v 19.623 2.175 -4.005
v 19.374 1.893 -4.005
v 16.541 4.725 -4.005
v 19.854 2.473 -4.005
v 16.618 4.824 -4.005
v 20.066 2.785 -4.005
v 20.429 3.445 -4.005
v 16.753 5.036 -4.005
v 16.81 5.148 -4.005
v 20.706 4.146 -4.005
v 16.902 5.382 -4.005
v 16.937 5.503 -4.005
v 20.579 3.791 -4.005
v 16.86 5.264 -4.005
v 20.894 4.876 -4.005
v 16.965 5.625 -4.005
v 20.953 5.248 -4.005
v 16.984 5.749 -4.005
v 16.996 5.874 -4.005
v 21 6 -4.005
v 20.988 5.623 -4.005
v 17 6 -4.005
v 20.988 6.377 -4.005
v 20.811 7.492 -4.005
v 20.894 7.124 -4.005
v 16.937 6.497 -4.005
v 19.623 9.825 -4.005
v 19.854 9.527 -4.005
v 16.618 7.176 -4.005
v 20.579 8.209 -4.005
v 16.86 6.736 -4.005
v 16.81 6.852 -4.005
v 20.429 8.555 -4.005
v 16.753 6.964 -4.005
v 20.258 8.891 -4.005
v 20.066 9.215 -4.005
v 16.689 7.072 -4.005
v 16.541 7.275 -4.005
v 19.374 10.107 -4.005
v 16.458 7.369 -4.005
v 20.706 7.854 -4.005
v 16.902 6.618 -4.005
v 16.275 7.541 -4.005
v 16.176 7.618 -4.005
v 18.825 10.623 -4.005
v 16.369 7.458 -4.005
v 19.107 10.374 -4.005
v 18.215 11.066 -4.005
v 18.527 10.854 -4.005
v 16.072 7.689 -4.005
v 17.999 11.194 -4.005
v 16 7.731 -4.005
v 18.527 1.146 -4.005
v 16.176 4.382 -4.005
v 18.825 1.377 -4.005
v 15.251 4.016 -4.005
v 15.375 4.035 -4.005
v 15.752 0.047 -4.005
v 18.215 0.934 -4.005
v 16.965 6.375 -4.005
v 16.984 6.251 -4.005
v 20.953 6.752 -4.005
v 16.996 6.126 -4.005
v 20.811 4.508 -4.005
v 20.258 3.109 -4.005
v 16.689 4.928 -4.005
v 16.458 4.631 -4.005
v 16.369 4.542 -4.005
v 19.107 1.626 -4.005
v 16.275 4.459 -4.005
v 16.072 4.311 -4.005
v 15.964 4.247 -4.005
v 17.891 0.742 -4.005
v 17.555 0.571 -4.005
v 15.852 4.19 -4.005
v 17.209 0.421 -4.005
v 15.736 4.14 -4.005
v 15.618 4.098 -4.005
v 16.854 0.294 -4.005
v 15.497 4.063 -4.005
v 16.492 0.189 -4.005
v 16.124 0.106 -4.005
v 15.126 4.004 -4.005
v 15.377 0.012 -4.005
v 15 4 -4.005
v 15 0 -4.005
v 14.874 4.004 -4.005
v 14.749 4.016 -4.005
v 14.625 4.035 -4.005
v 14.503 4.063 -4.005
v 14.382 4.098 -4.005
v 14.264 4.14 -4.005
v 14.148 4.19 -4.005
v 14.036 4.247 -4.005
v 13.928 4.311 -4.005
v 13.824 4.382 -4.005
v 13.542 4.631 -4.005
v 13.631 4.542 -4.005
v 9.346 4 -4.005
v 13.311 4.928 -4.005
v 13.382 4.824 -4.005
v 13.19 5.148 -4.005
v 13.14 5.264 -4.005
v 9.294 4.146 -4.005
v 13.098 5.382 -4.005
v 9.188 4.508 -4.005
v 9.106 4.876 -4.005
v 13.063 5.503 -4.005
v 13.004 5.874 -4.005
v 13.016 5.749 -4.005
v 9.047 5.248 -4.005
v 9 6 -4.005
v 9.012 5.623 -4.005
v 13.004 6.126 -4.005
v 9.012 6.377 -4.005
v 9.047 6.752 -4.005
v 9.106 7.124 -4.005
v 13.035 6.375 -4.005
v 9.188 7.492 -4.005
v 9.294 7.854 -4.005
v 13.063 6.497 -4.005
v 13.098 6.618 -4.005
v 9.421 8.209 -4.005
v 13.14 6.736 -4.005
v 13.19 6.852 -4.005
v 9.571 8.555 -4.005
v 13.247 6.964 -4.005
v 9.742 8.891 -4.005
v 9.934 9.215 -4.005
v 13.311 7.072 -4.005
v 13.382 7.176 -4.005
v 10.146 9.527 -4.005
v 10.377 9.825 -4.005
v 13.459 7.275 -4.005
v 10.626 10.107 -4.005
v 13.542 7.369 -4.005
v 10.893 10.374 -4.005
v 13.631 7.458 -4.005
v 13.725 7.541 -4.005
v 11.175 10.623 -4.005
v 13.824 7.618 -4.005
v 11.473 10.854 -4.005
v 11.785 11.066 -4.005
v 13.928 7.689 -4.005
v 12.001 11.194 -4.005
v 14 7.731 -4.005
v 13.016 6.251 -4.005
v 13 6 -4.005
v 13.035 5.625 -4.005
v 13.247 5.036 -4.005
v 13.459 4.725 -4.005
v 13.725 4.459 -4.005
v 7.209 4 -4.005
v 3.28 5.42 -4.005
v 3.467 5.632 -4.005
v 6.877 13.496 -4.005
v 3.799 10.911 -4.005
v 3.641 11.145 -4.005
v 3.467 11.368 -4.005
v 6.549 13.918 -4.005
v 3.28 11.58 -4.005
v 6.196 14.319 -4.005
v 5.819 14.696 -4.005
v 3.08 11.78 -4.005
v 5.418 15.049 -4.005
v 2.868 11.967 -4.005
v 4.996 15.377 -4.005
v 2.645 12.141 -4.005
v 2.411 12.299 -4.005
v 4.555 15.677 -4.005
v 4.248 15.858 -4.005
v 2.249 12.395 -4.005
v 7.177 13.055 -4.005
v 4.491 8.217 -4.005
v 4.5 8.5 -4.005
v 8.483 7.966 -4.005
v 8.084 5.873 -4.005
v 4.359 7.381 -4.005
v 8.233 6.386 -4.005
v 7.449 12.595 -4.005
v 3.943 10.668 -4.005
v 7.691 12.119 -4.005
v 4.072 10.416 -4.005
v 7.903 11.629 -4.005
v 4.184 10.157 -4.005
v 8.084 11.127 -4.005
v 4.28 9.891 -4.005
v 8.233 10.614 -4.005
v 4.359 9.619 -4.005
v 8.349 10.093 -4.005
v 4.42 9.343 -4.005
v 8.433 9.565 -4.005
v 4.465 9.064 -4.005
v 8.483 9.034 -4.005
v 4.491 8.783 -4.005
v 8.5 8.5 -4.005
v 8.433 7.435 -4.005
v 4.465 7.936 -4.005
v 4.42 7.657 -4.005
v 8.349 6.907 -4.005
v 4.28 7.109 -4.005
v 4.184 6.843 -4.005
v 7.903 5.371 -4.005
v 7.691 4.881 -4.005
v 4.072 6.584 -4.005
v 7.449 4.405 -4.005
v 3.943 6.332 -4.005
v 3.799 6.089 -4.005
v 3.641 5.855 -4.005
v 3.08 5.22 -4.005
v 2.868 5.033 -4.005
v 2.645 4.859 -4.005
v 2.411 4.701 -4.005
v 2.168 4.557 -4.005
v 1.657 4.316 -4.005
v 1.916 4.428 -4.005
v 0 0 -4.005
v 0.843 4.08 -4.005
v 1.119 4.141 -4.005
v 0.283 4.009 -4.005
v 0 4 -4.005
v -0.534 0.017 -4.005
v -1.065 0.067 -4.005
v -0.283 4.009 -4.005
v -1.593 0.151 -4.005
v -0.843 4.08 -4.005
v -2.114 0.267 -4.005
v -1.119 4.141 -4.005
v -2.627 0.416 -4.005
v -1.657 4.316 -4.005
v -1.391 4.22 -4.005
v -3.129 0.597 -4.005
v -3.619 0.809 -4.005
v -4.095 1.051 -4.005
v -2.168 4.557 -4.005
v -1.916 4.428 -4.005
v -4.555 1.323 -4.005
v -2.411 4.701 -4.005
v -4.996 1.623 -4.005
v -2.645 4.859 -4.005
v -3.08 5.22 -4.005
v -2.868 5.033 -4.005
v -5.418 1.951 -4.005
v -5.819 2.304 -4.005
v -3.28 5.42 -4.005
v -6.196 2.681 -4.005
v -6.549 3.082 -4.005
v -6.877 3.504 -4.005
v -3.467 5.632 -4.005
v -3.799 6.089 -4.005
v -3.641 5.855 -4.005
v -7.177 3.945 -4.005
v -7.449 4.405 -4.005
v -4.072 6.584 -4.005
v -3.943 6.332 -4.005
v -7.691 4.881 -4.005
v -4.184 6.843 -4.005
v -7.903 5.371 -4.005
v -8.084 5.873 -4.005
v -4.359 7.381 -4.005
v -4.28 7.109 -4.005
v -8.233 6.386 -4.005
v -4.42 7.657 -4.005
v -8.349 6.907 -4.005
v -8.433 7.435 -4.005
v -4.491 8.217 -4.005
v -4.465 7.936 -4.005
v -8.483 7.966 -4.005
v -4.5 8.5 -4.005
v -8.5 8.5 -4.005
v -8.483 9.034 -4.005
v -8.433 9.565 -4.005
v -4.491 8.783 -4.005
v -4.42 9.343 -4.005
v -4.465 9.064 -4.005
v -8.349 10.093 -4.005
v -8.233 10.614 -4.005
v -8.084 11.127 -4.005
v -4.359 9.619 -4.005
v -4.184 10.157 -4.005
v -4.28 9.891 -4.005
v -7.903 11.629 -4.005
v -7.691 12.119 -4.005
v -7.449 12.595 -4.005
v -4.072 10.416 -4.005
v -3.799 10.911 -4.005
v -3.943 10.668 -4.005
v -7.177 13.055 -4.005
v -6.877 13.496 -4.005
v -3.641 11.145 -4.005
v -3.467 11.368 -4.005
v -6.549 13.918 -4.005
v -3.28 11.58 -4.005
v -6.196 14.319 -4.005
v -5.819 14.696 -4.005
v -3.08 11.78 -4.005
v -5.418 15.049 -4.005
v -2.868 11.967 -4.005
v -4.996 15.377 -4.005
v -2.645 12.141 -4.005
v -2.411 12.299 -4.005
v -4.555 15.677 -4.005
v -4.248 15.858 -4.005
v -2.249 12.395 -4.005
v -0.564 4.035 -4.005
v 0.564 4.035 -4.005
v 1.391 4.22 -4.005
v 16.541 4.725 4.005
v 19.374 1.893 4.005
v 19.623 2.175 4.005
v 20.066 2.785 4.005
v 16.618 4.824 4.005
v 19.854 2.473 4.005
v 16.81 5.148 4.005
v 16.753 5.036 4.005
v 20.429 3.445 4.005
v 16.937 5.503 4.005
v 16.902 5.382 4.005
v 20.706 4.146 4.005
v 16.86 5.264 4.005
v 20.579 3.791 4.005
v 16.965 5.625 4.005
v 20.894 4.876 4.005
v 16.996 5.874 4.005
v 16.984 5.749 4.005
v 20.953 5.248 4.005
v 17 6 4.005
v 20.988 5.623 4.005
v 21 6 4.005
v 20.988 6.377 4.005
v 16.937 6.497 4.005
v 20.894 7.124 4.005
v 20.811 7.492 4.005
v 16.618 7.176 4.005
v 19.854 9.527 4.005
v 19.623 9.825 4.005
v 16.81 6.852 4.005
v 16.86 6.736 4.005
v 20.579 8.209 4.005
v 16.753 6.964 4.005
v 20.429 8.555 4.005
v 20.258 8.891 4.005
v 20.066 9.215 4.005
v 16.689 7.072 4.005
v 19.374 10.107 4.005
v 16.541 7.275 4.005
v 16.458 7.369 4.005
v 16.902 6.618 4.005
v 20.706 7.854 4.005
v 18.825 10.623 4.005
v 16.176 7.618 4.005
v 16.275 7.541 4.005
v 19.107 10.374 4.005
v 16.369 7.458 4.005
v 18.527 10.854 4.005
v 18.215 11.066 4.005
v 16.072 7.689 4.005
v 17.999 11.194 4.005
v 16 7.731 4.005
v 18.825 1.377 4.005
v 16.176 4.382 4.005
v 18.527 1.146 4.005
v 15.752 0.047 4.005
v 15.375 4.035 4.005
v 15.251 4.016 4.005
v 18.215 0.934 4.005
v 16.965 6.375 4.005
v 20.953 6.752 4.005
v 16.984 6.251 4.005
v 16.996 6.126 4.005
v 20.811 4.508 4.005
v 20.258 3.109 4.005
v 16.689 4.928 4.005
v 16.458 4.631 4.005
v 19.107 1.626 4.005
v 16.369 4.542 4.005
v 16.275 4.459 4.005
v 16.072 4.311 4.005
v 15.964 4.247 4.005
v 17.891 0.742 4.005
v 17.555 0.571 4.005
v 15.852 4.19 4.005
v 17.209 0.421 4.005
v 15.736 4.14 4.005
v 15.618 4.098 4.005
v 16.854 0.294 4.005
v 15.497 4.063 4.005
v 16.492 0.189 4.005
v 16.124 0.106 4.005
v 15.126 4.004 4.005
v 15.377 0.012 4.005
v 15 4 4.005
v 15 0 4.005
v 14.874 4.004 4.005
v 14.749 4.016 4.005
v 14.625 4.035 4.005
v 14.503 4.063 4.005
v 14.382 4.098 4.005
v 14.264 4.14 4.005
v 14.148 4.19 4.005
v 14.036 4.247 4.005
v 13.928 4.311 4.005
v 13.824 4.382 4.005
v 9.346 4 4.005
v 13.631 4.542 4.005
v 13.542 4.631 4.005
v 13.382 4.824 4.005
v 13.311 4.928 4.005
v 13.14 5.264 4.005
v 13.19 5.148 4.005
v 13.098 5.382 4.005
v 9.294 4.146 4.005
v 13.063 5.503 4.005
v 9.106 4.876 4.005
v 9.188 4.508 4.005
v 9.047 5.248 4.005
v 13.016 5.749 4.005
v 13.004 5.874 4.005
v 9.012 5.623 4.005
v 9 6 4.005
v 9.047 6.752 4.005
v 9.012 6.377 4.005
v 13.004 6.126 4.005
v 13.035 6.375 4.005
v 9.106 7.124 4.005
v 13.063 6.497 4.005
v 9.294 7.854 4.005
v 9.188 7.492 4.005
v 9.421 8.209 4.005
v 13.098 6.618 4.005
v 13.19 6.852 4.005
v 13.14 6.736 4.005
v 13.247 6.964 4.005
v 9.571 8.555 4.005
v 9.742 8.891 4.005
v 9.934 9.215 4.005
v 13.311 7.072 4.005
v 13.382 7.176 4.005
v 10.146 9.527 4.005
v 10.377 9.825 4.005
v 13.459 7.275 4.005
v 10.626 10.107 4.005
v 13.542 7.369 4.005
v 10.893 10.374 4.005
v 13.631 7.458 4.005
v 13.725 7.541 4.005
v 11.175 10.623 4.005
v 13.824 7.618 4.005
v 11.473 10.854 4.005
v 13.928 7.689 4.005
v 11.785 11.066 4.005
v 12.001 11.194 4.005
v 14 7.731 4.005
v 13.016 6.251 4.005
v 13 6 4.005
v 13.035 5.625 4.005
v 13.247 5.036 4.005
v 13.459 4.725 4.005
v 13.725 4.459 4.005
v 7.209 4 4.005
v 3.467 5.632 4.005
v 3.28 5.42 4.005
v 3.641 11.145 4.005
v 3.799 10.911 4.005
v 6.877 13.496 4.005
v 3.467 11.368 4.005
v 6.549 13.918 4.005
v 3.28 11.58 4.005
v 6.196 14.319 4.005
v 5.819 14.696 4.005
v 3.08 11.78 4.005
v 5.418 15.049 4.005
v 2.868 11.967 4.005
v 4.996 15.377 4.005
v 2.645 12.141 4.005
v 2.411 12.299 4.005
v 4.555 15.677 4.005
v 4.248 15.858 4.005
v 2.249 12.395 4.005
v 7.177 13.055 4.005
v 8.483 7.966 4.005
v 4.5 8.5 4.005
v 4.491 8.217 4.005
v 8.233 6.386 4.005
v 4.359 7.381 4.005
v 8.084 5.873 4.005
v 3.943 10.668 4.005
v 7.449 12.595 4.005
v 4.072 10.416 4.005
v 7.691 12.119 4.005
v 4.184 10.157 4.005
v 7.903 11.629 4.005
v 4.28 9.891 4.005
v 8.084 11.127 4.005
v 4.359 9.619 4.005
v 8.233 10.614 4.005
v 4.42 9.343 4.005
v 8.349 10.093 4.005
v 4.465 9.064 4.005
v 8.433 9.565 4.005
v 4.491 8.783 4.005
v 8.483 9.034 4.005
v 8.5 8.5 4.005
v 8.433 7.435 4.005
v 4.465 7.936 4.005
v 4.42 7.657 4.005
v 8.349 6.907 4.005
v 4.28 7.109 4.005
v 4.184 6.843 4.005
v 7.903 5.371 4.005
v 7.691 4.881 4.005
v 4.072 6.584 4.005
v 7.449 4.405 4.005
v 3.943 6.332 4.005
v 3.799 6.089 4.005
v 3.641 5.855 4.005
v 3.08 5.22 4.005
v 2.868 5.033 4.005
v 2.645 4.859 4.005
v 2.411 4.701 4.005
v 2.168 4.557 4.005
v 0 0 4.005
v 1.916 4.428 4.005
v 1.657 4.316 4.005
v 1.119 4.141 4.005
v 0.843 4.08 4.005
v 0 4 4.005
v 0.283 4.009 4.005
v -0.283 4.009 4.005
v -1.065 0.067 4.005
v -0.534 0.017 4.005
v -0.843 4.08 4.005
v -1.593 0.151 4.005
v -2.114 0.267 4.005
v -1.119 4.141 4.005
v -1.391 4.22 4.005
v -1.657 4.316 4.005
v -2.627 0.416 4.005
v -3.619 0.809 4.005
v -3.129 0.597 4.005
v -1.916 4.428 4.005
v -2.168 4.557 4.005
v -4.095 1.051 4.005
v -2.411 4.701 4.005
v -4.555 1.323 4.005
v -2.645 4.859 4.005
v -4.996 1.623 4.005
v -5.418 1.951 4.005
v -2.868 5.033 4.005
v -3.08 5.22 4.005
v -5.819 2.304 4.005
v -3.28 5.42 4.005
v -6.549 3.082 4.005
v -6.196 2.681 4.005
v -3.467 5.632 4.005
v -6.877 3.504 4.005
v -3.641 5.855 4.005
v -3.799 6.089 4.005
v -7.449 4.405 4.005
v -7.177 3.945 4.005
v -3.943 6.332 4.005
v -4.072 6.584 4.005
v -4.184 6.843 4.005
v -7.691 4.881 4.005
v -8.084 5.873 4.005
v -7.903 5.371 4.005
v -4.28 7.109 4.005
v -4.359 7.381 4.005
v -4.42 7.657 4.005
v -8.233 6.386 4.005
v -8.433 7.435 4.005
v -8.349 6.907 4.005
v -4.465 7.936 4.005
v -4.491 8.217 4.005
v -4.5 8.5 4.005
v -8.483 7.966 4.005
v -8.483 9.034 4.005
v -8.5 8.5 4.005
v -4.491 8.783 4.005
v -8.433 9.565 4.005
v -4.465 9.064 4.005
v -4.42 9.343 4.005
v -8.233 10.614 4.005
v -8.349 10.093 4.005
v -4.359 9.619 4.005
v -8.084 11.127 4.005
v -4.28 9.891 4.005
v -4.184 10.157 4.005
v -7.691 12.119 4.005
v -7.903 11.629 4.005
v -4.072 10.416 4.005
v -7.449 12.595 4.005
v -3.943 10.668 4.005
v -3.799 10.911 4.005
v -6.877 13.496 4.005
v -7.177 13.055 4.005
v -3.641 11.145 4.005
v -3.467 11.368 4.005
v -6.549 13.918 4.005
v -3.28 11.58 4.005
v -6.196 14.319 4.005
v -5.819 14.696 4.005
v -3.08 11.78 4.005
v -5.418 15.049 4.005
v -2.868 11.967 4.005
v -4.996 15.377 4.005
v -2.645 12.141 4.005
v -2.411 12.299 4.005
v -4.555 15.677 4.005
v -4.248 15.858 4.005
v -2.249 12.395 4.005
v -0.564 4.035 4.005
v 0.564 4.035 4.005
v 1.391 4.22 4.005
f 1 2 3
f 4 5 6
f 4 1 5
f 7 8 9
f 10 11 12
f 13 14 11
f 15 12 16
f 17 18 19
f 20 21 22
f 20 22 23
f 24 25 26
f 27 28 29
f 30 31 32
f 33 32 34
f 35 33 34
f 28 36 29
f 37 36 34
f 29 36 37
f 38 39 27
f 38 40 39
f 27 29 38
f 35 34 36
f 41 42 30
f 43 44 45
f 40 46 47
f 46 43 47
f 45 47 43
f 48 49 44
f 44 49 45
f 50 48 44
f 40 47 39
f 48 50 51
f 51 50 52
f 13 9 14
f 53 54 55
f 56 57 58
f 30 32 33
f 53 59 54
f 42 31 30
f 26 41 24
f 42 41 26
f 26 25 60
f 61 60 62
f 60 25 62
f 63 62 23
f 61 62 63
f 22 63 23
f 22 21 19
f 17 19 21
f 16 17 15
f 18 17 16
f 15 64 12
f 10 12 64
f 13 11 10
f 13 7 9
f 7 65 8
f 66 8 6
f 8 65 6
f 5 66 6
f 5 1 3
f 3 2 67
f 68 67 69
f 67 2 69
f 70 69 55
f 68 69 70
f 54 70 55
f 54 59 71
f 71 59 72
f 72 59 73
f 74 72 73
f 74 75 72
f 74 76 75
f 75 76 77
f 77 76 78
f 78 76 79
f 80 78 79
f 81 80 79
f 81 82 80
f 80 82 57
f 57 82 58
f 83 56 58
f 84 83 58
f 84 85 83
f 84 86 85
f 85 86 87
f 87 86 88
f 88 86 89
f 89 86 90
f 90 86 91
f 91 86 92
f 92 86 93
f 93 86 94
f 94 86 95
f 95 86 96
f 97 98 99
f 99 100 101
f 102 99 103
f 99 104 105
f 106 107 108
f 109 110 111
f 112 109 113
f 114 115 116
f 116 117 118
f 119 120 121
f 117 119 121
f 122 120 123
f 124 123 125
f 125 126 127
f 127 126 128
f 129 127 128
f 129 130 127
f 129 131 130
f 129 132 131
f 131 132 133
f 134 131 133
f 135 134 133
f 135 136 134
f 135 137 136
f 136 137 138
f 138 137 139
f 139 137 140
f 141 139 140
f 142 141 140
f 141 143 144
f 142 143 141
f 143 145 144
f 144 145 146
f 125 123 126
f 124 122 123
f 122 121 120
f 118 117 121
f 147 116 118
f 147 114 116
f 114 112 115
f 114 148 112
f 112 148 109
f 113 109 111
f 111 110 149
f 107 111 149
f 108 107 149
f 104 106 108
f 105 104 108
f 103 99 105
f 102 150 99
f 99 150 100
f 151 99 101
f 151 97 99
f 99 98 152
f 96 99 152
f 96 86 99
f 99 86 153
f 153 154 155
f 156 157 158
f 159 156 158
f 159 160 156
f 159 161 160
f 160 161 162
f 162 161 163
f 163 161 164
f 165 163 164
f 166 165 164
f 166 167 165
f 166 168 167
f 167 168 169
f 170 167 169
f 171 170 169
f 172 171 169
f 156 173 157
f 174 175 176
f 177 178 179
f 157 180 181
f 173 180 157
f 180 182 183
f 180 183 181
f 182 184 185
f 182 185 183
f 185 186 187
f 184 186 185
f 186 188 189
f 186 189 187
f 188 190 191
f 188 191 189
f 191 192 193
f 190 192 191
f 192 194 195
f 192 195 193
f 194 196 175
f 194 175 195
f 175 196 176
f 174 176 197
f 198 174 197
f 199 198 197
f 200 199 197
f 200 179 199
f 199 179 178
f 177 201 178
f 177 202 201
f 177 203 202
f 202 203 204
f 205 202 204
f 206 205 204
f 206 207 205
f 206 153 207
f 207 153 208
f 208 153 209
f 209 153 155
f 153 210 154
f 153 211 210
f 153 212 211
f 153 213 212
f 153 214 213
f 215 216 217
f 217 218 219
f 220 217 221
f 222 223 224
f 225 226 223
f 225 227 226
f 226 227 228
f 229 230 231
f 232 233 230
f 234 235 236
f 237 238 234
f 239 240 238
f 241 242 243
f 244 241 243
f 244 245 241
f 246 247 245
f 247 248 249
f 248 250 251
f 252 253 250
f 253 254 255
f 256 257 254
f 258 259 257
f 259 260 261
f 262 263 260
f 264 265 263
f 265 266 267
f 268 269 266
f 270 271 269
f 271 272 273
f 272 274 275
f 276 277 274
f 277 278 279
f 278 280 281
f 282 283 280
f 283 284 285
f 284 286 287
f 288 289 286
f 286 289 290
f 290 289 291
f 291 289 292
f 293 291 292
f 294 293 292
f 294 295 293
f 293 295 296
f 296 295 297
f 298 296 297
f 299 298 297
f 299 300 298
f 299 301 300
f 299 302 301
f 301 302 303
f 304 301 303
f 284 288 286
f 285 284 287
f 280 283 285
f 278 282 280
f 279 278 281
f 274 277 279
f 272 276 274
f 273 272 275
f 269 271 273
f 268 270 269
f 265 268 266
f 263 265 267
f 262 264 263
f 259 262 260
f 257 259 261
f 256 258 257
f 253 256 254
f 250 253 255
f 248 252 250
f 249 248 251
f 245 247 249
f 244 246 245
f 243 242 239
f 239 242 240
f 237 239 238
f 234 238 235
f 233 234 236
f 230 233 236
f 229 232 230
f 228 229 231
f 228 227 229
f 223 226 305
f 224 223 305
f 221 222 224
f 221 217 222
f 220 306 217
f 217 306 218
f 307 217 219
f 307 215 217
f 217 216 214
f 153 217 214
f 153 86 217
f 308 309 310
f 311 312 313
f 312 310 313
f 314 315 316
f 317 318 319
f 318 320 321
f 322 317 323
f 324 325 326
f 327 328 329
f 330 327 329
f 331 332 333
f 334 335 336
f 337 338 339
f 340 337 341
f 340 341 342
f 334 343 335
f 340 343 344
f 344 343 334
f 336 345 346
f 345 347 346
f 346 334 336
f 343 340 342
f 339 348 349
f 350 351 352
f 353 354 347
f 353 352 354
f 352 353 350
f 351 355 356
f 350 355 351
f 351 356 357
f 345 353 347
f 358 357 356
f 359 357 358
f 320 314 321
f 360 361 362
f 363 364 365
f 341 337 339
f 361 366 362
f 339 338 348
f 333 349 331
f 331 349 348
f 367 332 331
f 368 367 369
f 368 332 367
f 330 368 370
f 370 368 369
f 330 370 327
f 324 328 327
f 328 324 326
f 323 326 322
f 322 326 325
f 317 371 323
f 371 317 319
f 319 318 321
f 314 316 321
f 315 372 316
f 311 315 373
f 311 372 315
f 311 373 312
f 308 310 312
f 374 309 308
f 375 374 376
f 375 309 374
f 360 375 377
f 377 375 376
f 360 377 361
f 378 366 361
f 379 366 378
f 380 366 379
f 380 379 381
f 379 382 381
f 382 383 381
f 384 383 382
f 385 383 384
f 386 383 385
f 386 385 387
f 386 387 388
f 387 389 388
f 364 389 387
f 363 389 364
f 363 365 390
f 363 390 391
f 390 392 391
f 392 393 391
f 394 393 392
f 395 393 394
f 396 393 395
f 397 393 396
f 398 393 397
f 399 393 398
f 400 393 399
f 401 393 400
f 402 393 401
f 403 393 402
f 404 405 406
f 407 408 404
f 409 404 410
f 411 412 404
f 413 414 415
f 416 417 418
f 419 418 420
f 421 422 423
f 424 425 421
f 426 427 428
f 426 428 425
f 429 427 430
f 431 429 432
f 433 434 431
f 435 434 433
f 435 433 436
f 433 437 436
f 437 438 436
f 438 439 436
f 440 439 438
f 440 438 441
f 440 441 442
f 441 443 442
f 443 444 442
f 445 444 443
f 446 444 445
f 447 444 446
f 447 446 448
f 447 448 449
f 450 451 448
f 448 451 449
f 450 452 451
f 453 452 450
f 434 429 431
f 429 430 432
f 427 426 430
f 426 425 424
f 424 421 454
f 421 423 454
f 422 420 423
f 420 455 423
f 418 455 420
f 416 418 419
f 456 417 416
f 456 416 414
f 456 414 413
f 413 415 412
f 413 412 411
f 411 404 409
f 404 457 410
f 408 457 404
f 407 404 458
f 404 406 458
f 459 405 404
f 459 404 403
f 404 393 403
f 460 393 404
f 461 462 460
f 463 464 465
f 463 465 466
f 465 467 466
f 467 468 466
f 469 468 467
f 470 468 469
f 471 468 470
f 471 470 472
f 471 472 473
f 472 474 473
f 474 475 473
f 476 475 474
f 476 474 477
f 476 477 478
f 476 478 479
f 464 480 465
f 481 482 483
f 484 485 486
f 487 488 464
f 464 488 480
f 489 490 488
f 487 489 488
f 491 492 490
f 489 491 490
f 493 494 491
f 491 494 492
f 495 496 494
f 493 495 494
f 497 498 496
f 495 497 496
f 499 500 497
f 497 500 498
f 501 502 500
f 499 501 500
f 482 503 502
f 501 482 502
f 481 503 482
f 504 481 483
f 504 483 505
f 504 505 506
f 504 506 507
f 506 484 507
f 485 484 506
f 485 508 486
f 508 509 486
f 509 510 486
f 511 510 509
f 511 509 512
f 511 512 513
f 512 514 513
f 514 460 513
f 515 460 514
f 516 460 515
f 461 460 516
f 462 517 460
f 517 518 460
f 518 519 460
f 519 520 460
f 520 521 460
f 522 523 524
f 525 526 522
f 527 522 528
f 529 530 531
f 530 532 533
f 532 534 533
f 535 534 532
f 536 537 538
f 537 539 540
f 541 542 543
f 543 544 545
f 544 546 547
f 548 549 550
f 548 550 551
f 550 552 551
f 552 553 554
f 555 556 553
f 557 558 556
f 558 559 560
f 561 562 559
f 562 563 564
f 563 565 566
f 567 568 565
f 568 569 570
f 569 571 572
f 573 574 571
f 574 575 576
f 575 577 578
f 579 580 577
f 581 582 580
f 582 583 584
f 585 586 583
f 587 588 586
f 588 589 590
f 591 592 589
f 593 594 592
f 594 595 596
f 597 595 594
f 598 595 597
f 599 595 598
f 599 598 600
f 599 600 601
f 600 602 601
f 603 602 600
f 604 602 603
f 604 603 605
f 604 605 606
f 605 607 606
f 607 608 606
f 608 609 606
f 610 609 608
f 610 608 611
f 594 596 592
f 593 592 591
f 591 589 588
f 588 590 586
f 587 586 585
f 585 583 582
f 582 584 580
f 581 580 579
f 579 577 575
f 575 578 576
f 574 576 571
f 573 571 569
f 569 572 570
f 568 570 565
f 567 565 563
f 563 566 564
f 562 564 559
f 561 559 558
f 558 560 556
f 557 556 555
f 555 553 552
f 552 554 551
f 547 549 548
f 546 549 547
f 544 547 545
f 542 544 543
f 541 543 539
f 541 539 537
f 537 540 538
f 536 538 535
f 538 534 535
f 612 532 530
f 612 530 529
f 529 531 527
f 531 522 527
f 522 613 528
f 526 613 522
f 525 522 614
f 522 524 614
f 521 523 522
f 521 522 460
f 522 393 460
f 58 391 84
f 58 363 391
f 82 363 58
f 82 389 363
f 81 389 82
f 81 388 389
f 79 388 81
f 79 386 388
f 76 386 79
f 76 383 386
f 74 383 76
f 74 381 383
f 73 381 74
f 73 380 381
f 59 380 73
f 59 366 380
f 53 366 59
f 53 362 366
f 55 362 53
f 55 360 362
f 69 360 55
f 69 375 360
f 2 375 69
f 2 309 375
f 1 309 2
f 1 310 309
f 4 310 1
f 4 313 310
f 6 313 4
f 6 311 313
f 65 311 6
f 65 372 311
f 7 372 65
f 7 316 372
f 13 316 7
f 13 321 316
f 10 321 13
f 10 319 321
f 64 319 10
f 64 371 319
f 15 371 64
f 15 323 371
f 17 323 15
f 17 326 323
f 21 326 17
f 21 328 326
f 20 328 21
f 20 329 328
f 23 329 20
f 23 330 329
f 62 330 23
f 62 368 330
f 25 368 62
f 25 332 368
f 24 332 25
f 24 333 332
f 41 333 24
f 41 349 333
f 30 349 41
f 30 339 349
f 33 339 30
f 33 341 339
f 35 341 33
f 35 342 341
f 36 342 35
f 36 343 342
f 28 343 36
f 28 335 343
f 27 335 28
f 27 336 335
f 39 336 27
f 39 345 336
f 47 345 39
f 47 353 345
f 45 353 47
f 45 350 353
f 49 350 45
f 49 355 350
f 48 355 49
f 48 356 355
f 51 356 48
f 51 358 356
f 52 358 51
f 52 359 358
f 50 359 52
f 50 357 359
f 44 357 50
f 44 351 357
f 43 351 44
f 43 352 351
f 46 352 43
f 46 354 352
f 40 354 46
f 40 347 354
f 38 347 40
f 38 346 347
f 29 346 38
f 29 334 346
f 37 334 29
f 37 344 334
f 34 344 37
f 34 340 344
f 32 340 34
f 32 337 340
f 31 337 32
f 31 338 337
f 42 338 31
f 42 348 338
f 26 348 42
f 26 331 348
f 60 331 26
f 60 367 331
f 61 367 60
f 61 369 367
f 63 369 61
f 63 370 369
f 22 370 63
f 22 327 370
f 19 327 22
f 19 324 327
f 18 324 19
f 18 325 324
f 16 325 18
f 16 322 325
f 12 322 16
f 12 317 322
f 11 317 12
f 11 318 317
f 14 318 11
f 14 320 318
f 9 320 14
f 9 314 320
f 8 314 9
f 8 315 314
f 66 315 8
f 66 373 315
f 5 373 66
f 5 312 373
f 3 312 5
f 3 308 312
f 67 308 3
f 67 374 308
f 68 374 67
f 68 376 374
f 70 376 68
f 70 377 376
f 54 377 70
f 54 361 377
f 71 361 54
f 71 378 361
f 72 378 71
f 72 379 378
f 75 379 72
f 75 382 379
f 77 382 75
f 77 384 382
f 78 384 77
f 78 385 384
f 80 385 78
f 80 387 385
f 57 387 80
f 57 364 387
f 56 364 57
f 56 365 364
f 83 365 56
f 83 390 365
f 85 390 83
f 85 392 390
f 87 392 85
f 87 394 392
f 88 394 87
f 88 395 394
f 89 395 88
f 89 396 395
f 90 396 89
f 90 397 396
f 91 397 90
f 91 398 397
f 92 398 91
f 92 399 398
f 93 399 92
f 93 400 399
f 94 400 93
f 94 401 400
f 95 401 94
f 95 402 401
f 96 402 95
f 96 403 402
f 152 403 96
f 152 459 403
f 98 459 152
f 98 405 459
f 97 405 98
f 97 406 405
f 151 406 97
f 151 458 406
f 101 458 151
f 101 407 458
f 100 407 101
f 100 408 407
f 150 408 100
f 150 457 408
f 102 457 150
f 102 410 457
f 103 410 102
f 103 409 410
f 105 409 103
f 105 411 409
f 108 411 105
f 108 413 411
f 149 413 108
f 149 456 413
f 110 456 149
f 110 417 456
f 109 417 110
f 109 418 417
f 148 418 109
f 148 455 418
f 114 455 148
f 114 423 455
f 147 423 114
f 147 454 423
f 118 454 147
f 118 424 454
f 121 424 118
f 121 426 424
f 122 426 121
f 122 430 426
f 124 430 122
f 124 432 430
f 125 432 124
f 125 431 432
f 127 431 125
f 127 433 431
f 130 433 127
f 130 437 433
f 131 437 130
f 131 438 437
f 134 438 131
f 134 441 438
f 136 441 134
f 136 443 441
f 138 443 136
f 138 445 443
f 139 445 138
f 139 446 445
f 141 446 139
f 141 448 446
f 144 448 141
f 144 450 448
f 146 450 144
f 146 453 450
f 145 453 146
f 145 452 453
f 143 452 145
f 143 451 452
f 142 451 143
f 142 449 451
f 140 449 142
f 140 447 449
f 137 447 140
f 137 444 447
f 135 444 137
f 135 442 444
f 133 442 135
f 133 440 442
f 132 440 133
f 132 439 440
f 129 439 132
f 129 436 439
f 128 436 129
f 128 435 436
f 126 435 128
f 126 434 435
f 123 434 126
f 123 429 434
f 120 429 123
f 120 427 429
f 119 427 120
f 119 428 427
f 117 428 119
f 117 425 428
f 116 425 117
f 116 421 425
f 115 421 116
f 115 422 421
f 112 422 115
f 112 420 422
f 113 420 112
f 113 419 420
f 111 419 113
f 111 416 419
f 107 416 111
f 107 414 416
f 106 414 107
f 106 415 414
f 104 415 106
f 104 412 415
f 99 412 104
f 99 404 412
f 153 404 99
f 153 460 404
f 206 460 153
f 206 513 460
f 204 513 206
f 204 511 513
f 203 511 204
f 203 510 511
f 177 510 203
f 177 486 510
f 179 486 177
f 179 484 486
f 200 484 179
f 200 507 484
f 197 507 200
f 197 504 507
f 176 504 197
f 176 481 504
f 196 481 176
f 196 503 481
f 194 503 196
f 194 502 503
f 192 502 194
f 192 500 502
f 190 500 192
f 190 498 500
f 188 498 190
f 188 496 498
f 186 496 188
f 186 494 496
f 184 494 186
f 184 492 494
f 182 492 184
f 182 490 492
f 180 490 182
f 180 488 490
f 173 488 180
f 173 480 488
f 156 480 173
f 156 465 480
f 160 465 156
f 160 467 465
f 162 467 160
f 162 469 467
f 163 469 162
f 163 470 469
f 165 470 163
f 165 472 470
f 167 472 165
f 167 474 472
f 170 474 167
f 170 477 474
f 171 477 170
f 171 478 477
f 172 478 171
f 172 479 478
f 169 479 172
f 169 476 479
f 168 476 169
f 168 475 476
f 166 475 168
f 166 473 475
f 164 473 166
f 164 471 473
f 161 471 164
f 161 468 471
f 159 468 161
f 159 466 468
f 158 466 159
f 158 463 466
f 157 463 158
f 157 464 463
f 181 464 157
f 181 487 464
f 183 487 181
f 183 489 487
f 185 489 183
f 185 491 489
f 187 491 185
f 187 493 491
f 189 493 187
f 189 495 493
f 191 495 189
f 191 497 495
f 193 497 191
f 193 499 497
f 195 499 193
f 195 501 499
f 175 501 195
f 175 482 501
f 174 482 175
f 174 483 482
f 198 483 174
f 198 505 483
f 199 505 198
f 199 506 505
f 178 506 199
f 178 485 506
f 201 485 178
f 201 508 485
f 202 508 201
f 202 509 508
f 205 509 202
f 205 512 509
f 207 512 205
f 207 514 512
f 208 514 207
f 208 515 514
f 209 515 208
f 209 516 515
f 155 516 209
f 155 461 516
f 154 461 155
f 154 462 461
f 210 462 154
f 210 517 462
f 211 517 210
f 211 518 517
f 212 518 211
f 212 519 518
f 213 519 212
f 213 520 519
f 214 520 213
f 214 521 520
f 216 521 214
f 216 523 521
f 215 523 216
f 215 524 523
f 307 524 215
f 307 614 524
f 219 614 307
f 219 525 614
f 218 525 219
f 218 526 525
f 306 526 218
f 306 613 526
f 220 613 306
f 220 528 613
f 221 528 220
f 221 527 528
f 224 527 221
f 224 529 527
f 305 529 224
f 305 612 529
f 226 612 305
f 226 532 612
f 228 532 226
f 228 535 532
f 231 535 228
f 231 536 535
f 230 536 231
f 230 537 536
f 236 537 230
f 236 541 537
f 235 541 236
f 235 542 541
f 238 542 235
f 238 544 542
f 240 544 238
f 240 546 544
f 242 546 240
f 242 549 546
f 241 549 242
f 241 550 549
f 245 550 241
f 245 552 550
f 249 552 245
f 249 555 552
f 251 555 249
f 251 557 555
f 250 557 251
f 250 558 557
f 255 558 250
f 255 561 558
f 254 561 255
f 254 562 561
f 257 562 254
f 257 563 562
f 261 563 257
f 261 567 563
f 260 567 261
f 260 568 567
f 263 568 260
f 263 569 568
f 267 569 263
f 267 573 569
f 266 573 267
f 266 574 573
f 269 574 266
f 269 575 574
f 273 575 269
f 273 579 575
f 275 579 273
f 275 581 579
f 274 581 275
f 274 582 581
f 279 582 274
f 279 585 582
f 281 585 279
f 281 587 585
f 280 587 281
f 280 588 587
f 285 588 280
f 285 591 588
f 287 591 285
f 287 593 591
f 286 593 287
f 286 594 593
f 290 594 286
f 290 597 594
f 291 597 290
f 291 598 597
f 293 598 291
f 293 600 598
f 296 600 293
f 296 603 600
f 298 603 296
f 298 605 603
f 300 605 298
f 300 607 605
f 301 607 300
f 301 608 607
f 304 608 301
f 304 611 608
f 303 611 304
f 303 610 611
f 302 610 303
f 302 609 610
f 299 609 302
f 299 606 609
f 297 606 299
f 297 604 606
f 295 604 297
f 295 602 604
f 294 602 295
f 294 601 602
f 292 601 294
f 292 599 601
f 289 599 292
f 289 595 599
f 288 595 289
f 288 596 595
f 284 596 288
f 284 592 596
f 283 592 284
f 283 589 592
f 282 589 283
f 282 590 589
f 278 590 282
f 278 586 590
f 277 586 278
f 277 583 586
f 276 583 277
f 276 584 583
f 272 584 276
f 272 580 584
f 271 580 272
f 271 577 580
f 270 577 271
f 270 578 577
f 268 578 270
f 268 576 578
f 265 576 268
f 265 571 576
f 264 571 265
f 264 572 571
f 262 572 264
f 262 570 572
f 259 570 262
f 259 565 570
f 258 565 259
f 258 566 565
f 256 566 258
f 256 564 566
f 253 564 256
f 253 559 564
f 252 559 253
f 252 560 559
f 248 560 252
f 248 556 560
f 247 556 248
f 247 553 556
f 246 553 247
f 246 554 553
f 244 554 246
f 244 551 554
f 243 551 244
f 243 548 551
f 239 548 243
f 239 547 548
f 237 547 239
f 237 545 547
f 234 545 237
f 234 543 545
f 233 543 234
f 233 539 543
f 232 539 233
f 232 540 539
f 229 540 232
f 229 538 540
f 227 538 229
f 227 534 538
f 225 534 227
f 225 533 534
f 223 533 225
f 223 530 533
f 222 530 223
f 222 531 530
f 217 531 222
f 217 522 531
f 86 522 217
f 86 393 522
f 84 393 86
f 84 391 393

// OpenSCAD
/************** BEST VIEWED IN A CODE EDITOR 80 COLUMNS WIDE *******************
*
* Customizable Fishing Rod Clips
* Benjamen Johnson <workshop.electronsmith.com>
* 20180613
* Version 4
* openSCAD Version: 2015.03-2
*******************************************************************************/

// Diameter of the bottom section
inner_dia_1 = 9;

// Diameter of the top section
inner_dia_2 = 4;

// Wedge angle of the cut (how many degrees of the circle to cut)
wedge_angle = 60;

// Thickness of the clip
wall_thickness = 4;

// Distance between the sections
distance = 15;

// Height of the clip
height = 8;

// how round? The higher the rounder
facets=100;

/*[hidden]*/
// add a slight amount to holes so the model renders properly
render_offset = 0.01;

// calculate the outer diameters
outer_dia_1 = inner_dia_1+2*wall_thickness;
outer_dia_2 = inner_dia_2+2*wall_thickness;

linear_extrude(height+render_offset,center=false, convexity=10, twist=0,center=true)
union() {
// move so the outer wall of the bottom clip lines up with the X-axis    
translate([0,outer_dia_1/2,0]) difference() {
    circle(d=outer_dia_1, center=true,$fn=facets);
    circle(d=inner_dia_1, center=true,$fn=facets);
    rotate([0,0,90]) wedge(outer_dia_1*2,height+render_offset,wedge_angle);

}
// move so the outer wall of the top clip lines up with the X-axis    
translate([0,outer_dia_2/2,0]) difference() {
    translate([distance,0,0])circle(d=outer_dia_2, center=true,$fn=facets);  
    translate([distance,0,0])circle(d=inner_dia_2, center=true,$fn=facets);
    translate([distance,0,0])rotate([0,0,90]) wedge(outer_dia_2*2,height+render_offset,wedge_angle);

}
// join the two clips
translate([distance/2,wall_thickness/2])square([distance,wall_thickness],center=true);
}

module wedge(x=1,z=1,angle=45){
    angle=angle/2; 
    
        polygon([[0,0],
              [x*cos(angle),x*sin(angle)],
              [x*cos(angle),-x*sin(angle)]]);
        
    }
